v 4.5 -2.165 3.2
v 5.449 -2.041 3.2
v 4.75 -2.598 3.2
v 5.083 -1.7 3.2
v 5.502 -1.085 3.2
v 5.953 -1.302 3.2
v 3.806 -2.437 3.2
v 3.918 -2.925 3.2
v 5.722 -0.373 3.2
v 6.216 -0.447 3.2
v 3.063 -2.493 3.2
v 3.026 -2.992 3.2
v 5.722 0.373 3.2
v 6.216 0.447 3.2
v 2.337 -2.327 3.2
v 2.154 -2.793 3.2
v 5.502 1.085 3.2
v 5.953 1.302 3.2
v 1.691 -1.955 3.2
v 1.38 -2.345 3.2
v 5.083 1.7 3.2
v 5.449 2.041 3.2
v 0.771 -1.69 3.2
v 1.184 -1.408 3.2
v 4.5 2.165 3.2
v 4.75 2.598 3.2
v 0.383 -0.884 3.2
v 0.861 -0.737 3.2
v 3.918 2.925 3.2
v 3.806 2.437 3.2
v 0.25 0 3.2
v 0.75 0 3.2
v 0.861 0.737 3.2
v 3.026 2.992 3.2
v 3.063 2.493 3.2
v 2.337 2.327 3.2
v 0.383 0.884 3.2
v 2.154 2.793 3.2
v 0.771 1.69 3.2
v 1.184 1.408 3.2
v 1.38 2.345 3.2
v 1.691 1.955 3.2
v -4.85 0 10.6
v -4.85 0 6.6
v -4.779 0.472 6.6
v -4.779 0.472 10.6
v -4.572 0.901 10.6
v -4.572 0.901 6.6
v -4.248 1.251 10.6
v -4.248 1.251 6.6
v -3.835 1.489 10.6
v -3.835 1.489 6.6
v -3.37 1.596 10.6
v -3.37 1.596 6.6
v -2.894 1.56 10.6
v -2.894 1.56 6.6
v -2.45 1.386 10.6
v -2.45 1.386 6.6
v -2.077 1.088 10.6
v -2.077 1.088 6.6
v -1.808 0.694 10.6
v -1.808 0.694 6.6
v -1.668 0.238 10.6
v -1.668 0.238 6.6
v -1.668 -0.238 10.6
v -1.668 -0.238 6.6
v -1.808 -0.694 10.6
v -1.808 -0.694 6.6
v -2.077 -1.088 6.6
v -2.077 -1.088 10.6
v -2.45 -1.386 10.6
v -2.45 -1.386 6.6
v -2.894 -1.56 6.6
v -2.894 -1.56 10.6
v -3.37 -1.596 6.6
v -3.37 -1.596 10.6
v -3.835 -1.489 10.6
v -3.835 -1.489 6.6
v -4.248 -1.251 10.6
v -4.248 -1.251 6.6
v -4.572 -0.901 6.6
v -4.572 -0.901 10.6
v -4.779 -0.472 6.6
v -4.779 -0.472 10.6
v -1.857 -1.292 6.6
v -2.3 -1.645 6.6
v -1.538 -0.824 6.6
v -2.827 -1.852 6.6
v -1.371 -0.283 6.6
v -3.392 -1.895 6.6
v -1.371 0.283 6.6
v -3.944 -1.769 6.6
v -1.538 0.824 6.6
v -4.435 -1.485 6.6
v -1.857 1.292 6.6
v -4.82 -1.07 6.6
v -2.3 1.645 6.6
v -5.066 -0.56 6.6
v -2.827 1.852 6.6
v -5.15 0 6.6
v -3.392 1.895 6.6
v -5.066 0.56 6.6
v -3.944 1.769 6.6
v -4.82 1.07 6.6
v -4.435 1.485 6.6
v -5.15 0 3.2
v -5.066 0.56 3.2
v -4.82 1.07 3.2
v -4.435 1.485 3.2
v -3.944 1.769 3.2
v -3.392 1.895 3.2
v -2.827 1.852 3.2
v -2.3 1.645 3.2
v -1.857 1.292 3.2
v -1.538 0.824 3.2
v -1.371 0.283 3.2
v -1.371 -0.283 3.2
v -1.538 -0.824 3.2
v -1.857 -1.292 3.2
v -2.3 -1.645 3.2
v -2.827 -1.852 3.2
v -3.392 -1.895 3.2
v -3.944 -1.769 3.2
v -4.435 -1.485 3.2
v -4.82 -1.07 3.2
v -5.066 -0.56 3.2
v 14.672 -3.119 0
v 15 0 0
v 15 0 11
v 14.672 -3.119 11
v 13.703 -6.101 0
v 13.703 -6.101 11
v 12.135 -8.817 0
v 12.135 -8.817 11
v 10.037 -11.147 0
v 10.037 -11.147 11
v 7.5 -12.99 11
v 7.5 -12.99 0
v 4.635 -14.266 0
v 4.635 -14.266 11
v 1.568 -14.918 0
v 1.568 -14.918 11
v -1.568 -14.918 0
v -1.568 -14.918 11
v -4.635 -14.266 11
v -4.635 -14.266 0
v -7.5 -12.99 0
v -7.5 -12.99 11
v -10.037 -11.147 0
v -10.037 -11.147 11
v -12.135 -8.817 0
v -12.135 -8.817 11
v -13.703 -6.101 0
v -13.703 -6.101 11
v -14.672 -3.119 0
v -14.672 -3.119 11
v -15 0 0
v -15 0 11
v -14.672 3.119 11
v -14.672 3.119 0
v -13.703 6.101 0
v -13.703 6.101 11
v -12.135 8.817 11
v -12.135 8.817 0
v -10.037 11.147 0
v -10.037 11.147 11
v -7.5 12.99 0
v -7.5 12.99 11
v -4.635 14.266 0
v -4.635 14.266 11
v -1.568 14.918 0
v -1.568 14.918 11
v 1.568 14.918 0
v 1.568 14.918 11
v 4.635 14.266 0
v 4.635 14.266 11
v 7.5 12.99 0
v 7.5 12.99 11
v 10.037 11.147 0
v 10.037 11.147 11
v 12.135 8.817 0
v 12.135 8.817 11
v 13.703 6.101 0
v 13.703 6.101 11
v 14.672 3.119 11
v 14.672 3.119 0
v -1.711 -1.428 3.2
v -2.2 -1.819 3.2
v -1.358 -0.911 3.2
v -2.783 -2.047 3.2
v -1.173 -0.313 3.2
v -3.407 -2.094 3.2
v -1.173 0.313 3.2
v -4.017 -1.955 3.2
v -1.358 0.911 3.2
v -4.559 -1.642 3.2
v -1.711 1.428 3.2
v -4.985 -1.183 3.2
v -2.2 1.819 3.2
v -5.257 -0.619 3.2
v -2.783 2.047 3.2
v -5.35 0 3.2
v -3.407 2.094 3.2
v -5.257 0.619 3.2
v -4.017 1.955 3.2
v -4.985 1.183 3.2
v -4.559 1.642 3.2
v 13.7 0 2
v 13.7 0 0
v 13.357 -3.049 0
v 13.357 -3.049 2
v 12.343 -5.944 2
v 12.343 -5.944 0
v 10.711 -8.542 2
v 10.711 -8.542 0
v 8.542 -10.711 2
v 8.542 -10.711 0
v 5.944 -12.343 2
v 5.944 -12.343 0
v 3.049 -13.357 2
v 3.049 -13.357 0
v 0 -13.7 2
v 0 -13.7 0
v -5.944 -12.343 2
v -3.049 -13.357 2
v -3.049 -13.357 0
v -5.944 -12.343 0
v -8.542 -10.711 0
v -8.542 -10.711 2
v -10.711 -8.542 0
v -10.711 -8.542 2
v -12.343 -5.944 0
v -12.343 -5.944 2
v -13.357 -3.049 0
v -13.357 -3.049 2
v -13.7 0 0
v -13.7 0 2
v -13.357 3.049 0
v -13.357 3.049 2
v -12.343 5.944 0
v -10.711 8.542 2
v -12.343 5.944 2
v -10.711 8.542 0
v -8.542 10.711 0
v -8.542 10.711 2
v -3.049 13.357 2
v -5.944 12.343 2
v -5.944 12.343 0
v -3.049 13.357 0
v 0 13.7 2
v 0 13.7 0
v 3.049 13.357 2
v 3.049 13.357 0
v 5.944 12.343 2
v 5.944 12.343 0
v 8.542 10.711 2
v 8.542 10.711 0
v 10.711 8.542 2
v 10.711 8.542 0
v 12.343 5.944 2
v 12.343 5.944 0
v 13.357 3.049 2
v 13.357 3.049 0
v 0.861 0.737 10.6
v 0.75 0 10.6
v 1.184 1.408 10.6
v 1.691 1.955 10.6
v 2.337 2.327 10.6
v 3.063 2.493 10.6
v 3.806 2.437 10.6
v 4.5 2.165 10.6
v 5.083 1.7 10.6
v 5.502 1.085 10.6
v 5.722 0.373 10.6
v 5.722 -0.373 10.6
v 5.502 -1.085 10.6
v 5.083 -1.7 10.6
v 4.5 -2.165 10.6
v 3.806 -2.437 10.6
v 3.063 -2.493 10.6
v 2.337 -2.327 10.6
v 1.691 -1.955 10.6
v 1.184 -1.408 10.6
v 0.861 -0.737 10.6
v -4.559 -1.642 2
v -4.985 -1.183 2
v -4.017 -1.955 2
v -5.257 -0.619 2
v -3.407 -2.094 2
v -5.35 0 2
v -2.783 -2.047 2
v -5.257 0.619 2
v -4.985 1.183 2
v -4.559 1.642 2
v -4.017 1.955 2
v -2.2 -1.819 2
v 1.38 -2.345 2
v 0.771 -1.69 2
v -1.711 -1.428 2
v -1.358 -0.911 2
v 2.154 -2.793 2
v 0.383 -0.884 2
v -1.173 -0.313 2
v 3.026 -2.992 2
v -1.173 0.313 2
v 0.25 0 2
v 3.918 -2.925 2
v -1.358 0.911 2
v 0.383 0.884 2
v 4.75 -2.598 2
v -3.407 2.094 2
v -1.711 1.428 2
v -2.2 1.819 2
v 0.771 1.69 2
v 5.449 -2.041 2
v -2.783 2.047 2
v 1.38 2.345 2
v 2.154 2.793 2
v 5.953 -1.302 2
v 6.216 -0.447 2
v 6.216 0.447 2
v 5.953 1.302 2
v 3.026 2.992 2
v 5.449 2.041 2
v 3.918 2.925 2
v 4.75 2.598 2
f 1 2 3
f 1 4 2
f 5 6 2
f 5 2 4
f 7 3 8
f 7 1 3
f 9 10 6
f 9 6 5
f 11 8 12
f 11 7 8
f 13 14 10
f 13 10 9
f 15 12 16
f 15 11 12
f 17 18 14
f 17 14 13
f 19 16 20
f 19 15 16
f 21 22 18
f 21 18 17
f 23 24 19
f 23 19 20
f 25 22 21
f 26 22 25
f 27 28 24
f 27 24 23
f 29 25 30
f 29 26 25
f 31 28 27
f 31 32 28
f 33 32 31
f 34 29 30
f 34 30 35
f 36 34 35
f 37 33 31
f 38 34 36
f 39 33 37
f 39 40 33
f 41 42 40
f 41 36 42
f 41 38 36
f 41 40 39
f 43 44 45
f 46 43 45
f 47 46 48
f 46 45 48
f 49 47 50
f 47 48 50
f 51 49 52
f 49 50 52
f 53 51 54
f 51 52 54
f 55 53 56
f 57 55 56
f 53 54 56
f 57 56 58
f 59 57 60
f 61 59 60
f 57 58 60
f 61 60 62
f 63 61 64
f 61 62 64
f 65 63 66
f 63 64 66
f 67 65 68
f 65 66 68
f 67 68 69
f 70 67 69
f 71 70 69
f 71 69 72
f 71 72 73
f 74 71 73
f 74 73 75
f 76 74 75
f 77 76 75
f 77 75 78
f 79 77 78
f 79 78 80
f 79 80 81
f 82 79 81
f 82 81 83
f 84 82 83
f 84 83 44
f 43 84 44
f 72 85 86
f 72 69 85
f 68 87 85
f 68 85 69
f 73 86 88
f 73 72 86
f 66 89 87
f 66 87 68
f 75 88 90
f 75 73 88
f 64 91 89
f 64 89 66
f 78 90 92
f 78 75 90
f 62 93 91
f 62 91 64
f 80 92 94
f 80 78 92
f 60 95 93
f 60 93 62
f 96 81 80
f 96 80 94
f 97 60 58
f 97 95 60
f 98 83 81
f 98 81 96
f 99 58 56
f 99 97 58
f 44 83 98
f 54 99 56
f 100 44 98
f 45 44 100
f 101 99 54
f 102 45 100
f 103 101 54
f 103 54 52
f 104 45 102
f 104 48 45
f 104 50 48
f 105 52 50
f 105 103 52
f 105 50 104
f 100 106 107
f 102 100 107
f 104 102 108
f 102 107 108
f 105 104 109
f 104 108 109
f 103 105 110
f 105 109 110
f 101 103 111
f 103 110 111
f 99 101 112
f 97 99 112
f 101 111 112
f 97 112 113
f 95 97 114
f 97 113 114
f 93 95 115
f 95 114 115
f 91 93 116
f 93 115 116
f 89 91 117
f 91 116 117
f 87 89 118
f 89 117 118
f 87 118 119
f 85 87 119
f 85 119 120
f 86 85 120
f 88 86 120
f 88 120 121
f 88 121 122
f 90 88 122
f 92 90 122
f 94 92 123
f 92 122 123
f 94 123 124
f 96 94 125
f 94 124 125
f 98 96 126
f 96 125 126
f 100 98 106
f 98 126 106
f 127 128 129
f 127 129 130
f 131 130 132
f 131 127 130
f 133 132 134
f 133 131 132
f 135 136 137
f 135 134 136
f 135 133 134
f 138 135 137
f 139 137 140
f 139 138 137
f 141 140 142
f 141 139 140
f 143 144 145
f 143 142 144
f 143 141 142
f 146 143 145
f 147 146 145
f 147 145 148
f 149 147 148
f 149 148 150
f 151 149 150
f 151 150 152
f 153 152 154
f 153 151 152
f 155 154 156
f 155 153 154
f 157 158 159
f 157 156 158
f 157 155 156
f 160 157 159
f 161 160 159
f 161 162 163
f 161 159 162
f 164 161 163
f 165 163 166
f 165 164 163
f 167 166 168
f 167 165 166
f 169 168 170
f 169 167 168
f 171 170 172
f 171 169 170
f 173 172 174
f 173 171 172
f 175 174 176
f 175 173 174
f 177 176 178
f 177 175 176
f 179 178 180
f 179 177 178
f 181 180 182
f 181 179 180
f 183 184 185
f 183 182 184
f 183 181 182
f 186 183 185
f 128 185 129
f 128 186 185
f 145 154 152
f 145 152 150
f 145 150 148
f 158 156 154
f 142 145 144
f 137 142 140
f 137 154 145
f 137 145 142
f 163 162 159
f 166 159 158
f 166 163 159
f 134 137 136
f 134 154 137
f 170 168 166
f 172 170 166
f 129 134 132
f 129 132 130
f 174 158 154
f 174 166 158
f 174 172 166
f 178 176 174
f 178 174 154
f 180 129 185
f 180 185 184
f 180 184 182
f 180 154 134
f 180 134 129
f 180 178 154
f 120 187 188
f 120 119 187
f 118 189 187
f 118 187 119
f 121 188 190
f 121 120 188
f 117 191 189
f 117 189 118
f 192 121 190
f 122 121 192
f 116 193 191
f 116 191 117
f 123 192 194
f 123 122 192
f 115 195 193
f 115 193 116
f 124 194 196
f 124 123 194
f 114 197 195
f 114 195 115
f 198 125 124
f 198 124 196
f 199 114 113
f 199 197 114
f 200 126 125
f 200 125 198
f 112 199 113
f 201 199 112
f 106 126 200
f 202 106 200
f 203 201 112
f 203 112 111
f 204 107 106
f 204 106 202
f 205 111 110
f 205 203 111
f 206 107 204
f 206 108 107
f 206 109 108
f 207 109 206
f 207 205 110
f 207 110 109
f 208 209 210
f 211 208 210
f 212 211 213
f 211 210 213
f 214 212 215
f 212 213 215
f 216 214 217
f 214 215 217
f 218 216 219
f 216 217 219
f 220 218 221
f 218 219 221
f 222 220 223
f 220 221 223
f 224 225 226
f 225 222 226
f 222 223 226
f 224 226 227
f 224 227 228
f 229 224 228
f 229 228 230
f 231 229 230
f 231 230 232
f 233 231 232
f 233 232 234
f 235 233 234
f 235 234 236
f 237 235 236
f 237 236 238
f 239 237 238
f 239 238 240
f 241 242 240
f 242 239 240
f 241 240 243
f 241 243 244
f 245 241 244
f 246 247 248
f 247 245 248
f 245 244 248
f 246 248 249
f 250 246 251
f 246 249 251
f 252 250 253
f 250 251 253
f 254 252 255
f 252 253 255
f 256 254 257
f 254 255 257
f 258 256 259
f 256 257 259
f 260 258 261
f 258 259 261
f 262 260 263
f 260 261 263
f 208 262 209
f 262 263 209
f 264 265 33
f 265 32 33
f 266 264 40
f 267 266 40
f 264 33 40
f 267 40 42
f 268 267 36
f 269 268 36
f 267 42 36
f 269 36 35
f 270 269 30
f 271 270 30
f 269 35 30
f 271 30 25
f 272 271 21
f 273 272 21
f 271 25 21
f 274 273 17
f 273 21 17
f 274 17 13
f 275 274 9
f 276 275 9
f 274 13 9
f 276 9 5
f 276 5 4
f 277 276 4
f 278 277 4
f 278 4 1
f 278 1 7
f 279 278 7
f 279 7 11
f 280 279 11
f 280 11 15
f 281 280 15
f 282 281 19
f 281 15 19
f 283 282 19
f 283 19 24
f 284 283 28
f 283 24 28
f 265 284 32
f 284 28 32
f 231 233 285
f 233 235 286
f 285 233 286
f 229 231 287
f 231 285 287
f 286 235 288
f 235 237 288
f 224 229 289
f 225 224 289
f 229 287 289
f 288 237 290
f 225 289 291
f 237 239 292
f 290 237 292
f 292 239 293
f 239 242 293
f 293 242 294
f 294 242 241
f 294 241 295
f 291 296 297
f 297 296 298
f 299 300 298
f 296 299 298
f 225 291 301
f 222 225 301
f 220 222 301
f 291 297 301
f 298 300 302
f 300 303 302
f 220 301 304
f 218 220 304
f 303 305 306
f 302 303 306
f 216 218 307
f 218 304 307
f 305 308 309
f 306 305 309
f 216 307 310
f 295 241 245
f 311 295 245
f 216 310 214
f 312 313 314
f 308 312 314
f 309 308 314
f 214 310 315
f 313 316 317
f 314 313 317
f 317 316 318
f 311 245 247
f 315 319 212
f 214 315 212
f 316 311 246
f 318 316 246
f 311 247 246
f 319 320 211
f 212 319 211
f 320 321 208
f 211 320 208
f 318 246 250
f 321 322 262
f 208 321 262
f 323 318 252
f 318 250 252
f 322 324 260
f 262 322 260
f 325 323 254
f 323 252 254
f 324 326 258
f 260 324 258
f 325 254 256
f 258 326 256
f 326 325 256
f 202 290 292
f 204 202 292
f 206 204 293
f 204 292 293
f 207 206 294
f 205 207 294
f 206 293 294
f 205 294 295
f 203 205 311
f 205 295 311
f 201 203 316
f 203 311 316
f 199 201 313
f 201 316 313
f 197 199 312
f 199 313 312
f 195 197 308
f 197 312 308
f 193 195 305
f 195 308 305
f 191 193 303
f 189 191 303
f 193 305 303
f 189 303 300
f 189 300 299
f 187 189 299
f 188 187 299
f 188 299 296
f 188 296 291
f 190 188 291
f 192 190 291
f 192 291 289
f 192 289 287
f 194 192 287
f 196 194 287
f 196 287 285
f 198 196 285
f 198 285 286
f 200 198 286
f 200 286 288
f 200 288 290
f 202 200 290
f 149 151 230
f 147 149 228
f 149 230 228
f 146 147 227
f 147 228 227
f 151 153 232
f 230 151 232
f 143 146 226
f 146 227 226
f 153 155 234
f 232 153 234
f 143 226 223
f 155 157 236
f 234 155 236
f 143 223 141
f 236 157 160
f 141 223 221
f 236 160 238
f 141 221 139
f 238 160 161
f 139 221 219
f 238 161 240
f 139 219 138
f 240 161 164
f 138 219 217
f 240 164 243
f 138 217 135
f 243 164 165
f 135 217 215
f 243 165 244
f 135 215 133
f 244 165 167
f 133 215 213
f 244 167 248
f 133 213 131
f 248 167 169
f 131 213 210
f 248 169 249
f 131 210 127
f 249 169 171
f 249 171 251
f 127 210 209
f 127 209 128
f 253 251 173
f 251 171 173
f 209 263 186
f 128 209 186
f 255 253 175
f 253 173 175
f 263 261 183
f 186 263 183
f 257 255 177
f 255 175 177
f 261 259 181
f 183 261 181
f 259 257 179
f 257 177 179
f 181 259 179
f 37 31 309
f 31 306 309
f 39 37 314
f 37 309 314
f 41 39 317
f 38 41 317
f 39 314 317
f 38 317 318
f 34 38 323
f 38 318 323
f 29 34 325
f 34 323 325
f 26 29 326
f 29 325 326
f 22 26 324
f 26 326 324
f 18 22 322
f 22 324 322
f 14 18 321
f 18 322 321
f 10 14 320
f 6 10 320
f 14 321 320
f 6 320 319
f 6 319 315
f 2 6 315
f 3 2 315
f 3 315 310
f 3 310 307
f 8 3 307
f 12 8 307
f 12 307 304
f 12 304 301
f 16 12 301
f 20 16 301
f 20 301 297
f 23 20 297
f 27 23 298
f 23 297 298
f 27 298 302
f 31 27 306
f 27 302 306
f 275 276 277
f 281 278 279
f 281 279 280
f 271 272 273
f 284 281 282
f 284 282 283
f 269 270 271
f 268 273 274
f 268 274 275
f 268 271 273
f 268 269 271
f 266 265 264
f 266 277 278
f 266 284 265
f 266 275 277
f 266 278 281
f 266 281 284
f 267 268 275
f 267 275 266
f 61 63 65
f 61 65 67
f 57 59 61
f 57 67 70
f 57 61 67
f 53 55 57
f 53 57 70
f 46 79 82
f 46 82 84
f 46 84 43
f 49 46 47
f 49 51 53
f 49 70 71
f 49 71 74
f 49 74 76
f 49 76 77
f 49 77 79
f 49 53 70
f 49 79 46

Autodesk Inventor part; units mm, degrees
ref_plane "YZ Plane" through (0, 0, 0) normal (1, 0, 0) x (0, 1, 0)
ref_plane "XZ Plane" through (0, 0, 0) normal (0, 1, 0) x (-1, 0, 0)
ref_plane "XY Plane" through (0, 0, 0) normal (0, 0, 1) x (1, 0, 0)
sketch "Skizze1" plane through (0, 0, 0) normal (0, 0, 1) x (1, 0, 0)
  circle A0 centre (0, 0) radius 13.7
  circle A1 centre (0, 0) radius 15
  dimension "d0" = 27.4
  dimension "d1" = 30
extrude "Extrusion1" add sketch "Skizze1" along normal blind 2
sketch "Skizze2" plane through (0, 0, 2) normal (0, 0, 1) x (1, 0, 0)
  circle A0 centre (0, 0) radius 15
  dimension "d4" = 30
extrude "Extrusion2" add sketch "Skizze2" along normal blind 9
sketch "Skizze3" plane through (0, 0, 2) normal (0, 0, -1) x (-1, 0, 0)
  circle A0 centre (3.25, 0) radius 2.1
  circle A1 centre (-3.25, 0) radius 3
  point P0 (0, 0)
  dimension "d7" = 4.2
  dimension "d8" = 6
  dimension "d10" = 3.25
  dimension "d11" = 3.25
  dimension "d12" = 6.5
extrude "Extrusion3" cut sketch "Skizze3" against normal blind 1.2
sketch "Skizze4" plane through (3.25, 0, 3.2) normal (0, 0, -1) x (-1, 0, 0)
  circle A0 centre (0, 0) radius 2.5
  circle A1 centre (6.5, 0) radius 2.1 projected
  circle A2 centre (6.5, 0) radius 1.9
  point P0 (3.25, 0)
  dimension "d15" = 5
  dimension "d16" = 3.8
  dimension "d17" = 6.5
  dimension "d18" = 3.25
extrude "Extrusion4" cut sketch "Skizze4" against normal blind 3.4 contours A0 | A2
sketch "Skizze5" plane through (3.25, 0, 6.6) normal (0, 0, -1) x (-1, 0, 0)
  circle A0 centre (6.5, 0) radius 1.9 projected
  circle A1 centre (6.5, 0) radius 1.6
  circle A2 centre (0, 0) radius 2.5
  point P0 (3.25, 0)
  dimension "d21" = 3.2
  dimension "d22" = 5
  dimension "d23" = 6.5
  dimension "d24" = 3.25
extrude "Extrusion5" cut sketch "Skizze5" against normal blind 4 contours A1 | A2
properties part number "schablone"
